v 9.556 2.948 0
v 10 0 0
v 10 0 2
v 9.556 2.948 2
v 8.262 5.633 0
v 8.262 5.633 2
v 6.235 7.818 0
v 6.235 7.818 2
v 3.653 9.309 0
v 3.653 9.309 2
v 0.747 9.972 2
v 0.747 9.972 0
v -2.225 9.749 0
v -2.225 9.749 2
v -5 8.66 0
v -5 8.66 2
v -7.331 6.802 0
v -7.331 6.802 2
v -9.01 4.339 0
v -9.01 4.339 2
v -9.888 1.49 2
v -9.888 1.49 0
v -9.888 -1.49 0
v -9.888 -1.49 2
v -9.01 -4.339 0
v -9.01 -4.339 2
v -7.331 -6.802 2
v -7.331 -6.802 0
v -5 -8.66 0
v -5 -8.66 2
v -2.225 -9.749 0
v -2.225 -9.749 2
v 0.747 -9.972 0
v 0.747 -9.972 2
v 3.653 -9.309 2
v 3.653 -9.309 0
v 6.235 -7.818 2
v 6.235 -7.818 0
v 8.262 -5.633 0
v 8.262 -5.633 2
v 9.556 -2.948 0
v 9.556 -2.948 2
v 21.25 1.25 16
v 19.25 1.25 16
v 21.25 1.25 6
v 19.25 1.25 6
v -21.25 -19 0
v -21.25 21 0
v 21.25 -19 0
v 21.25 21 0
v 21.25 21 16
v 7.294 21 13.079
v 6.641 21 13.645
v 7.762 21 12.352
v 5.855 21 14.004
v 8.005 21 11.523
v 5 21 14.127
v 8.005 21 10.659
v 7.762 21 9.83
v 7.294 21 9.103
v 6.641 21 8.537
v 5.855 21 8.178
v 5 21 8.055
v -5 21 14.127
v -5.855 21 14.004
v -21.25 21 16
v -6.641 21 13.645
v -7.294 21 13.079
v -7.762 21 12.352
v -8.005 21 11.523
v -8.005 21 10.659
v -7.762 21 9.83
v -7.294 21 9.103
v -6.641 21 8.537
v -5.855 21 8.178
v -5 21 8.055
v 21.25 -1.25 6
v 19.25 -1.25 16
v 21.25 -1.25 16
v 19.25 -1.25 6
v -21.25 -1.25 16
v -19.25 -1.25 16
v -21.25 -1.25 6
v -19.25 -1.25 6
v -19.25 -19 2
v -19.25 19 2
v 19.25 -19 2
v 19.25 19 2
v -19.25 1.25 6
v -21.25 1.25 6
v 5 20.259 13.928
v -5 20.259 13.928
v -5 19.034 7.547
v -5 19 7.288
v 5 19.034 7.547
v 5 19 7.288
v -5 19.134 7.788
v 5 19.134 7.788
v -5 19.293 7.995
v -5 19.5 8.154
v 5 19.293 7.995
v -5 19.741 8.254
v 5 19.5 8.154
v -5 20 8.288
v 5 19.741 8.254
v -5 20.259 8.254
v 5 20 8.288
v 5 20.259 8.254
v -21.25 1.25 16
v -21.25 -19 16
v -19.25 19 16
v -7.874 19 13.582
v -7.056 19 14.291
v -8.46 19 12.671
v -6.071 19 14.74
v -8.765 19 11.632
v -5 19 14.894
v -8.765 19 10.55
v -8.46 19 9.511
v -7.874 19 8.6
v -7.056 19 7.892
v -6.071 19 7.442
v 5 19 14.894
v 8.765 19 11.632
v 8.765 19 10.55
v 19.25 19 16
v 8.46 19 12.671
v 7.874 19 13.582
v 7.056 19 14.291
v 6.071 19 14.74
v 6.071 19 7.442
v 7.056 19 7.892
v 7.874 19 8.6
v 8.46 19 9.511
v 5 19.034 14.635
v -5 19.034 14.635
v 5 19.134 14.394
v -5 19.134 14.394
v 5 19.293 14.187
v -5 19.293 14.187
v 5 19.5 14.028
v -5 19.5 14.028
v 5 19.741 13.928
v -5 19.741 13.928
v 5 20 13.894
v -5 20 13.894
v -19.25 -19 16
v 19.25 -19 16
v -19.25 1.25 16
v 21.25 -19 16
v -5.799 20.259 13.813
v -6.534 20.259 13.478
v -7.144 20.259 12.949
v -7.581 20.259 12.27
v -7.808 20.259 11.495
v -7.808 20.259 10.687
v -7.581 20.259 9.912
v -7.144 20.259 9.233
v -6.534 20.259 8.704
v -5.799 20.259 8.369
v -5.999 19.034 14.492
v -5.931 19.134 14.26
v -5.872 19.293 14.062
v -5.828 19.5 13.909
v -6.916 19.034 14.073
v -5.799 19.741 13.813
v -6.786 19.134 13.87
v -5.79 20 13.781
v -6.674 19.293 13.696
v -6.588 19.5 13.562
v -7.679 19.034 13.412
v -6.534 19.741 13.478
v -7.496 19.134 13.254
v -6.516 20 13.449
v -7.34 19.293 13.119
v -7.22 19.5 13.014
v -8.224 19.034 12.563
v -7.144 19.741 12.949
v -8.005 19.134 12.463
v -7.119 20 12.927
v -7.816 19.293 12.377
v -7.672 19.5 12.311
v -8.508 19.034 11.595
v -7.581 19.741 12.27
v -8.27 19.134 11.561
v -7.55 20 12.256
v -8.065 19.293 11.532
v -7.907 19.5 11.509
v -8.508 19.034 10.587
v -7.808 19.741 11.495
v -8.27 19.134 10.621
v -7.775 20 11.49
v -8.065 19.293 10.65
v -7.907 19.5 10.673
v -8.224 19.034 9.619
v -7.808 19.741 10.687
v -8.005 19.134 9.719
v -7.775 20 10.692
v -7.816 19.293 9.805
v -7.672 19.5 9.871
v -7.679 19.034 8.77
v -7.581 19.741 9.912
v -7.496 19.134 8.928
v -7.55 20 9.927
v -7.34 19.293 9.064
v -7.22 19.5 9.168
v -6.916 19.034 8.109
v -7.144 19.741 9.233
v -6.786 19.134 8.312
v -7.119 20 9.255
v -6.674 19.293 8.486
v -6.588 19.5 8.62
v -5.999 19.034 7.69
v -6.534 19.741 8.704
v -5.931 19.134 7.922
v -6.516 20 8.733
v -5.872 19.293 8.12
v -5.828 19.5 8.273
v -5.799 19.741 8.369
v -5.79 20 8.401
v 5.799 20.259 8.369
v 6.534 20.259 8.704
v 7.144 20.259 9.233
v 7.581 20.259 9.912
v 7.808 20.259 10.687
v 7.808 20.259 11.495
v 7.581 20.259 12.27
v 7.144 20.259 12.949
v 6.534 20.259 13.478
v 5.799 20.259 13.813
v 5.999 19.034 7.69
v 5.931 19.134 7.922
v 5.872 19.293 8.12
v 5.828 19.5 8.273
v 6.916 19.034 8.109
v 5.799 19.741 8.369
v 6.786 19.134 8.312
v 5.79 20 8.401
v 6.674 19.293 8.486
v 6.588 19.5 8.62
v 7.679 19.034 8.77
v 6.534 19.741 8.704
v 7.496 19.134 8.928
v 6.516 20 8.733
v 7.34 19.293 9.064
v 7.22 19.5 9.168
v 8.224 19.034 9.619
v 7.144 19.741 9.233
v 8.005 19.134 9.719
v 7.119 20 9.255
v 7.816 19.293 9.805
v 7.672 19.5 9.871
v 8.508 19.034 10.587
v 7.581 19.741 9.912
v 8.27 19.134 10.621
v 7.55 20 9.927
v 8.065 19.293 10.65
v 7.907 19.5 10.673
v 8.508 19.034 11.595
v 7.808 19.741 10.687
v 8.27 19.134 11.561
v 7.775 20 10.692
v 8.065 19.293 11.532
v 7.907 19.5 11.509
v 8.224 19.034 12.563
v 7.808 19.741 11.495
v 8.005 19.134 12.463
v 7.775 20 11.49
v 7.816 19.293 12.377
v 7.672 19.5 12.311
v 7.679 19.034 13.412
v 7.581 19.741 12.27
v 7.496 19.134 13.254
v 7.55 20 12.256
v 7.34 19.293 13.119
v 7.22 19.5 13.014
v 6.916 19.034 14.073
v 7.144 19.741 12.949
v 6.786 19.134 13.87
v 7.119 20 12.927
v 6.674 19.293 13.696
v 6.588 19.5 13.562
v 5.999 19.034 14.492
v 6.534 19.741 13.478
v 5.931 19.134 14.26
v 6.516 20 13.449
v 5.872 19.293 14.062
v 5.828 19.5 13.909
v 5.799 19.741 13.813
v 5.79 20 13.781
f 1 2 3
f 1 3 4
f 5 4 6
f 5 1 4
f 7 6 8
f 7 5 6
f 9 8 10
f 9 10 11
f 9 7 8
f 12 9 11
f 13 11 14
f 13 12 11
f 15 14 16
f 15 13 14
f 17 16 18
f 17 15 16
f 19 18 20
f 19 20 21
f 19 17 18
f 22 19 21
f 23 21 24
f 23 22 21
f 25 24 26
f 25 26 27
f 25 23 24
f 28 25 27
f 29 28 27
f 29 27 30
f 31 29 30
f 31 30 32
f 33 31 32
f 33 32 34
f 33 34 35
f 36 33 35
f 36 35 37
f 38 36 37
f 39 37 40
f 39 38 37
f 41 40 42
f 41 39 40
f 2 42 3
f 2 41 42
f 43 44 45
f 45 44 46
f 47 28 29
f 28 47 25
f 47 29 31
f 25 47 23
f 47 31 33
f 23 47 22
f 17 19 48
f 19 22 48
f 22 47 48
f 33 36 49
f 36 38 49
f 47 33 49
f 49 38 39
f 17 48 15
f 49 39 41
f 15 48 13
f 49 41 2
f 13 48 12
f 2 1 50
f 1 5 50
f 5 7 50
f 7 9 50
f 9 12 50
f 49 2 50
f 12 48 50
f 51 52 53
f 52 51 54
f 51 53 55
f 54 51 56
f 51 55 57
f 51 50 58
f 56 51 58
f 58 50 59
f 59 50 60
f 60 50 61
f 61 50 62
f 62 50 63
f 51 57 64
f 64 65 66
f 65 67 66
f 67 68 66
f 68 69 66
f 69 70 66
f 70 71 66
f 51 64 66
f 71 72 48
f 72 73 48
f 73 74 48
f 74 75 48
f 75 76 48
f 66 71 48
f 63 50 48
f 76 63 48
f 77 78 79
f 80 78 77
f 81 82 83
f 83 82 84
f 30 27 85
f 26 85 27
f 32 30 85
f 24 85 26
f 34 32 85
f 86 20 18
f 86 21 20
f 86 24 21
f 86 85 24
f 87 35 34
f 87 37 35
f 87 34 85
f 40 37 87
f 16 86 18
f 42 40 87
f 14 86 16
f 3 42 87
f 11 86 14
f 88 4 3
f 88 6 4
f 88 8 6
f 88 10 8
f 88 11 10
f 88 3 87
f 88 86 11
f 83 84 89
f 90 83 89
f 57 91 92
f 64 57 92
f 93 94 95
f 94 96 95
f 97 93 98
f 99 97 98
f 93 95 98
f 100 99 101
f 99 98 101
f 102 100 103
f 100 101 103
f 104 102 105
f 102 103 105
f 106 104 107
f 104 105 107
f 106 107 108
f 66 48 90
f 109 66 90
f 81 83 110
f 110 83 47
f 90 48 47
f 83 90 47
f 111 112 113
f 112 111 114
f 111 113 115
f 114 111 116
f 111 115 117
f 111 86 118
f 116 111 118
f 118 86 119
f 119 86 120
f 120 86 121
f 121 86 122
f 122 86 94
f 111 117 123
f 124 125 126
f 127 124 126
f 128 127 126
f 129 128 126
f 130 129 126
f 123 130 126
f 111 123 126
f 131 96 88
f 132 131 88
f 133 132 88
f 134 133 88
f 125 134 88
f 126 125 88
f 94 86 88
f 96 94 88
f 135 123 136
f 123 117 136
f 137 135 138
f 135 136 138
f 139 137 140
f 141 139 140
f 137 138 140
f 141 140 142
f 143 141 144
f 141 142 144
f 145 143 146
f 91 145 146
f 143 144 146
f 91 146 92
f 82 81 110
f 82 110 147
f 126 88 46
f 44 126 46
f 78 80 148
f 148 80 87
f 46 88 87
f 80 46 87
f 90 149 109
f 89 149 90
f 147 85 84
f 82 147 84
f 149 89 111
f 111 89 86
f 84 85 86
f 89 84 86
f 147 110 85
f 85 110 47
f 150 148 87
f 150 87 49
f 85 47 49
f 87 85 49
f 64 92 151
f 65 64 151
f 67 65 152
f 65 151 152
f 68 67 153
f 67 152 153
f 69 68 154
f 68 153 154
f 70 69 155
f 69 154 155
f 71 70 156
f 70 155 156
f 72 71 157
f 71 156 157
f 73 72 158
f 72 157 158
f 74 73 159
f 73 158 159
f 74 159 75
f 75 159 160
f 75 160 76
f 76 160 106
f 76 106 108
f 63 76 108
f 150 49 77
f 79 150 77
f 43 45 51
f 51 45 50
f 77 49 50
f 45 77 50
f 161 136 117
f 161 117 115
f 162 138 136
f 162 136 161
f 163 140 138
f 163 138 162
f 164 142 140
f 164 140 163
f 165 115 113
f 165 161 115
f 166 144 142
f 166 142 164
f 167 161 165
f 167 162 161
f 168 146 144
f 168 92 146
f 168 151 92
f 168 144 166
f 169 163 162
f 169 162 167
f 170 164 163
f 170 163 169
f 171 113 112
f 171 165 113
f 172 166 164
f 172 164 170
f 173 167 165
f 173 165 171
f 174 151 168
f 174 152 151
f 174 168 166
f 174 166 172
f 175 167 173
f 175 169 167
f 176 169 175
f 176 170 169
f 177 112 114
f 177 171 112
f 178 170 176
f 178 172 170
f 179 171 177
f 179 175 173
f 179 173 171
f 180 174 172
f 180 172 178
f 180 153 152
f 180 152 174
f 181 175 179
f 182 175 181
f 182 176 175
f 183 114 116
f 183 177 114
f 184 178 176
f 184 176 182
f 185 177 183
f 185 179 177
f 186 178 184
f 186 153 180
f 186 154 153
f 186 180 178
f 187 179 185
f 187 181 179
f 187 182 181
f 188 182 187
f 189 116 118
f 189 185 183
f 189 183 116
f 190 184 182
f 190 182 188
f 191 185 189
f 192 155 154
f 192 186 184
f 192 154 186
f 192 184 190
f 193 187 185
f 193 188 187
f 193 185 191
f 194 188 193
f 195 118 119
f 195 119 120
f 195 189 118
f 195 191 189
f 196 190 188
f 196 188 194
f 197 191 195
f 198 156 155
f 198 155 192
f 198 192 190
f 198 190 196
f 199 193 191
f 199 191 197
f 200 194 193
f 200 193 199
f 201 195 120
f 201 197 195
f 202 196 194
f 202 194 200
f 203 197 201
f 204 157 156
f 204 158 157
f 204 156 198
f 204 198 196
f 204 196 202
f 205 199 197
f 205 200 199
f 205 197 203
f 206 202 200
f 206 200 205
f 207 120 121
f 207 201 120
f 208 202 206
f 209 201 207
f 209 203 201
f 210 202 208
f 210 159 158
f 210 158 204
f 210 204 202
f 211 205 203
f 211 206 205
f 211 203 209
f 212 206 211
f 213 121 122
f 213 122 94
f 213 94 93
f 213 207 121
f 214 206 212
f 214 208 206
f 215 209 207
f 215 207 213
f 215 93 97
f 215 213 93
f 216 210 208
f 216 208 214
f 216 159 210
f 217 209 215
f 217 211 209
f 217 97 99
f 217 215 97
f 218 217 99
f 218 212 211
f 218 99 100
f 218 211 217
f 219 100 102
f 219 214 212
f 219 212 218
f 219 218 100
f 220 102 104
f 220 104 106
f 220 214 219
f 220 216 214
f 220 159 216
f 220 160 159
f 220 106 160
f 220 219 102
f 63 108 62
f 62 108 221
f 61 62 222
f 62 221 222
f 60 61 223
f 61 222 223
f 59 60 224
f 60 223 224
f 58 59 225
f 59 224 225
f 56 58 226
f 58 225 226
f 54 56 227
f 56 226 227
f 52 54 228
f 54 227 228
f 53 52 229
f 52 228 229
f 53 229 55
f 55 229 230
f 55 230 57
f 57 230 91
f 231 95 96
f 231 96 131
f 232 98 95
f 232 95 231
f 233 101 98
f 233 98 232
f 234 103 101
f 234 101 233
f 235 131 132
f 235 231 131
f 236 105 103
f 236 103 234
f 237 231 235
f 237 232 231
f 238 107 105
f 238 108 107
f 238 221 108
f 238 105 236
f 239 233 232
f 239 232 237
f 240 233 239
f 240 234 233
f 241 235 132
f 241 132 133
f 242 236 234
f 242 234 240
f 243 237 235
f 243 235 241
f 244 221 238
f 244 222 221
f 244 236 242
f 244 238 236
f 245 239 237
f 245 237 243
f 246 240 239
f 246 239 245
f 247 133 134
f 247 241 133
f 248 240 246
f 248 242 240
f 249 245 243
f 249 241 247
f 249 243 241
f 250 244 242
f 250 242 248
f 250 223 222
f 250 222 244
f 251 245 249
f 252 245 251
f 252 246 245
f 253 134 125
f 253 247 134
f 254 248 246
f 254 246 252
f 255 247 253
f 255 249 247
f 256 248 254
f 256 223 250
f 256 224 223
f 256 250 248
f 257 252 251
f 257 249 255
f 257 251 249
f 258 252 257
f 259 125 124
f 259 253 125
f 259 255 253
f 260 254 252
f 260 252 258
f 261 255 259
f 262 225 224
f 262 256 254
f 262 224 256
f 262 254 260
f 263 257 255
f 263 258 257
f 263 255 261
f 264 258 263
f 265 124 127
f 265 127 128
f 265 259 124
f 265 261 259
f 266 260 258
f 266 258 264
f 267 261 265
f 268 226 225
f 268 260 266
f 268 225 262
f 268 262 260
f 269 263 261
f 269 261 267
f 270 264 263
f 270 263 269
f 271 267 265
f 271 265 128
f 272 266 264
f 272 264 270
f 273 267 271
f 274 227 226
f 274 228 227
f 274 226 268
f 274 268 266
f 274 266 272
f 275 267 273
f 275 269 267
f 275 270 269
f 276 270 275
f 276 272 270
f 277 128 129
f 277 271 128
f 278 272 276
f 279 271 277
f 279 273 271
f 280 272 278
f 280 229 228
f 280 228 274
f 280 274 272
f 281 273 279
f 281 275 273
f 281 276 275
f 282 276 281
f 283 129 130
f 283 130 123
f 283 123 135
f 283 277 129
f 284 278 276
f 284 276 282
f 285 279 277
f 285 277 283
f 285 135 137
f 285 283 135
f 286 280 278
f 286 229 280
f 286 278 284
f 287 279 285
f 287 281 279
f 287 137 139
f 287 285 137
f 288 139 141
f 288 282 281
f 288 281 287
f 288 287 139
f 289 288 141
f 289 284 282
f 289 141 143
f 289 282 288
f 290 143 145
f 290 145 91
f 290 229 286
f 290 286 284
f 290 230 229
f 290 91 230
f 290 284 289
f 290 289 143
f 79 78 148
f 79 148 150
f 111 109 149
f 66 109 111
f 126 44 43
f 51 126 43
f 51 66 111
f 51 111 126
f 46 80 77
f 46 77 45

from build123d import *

# Parameters (mm, degrees)
SKETCH1_W                = 38.5
SKETCH1_H                = 38
SKETCH1_R                = 10
BOSS_EXTRUDE1_DEPTH      = 2
BOSS_EXTRUDE2_DEPTH      = 14
BOSS_EXTRUDE2_DEPTH_BACK = 2
CUT_EXTRUDE1_REACH       = 50.345
SKETCH3_W                = 10
SKETCH3_H                = 2.5
CUT_EXTRUDE2_DEPTH       = 47.384938288
CUT_EXTRUDE2_DRAFT       = 15
FILLET1_R                = 1


with BuildPart() as part:
    # Sketch1 → Boss-Extrude1 (new body)
    with BuildSketch(Plane.XY):
        Rectangle(SKETCH1_W, SKETCH1_H)
        Circle(SKETCH1_R, mode=Mode.SUBTRACT)
    extrude(amount=BOSS_EXTRUDE1_DEPTH)

    # Sketch2 → Boss-Extrude2 (add, two sides: drawn at the far end of the back side and taken through both)
    with BuildSketch(Plane.XY.offset(2).offset(-BOSS_EXTRUDE2_DEPTH_BACK)):
        Polygon((-21.25, -19), (-19.25, -19), (-19.25, 19), (19.25, 19), (19.25, -19), (21.25, -19), (21.25, 21), (-21.25, 21), align=None)
    extrude(amount=BOSS_EXTRUDE2_DEPTH + BOSS_EXTRUDE2_DEPTH_BACK)

    # Sketch3 → Cut-Extrude1 (cut, up to next)
    with BuildSketch(Plane(origin=(-19.25, 0, 0), x_dir=(0, 0, -1), z_dir=(1, 0, 0)), mode=Mode.PRIVATE) as cut_extrude1_sk1:
        with Locations((-11, 0)):
            Rectangle(SKETCH3_W, SKETCH3_H)
    cut_extrude1_tool1 = extrude(cut_extrude1_sk1.sketch, amount=-CUT_EXTRUDE1_REACH, mode=Mode.PRIVATE) & part.part
    cut_extrude1 = cut_extrude1_tool1.solids().sort_by_distance((-19.25, 0, 11))[0]
    add(cut_extrude1, mode=Mode.SUBTRACT)

    # Mirror1: Cut-Extrude1 across plane
    add(cut_extrude1.mirror(Plane(origin=(0, 0, 0), x_dir=(0, 0, 1), z_dir=(1, 0, 0))), mode=Mode.SUBTRACT)


with BuildPart() as cut_extrude2_tool:
    # Sketch5 → Cut-Extrude2 (with draft: the straight prism first)
    with BuildSketch(Plane.XZ.offset(-19)):
        with BuildLine():
            ThreePointArc((-5, 13.591034656), (-7.5, 11.091034656), (-5, 8.591034656))
            Line((-5, 8.591034656), (5, 8.591034656))
            ThreePointArc((5, 8.591034656), (7.5, 11.091034656), (5, 13.591034656))
            Line((5, 13.591034656), (-5, 13.591034656))
        make_face()
    extrude(amount=-CUT_EXTRUDE2_DEPTH)
    # Cut-Extrude2: the draft: its side faces are tilted about the plane it starts from
    cut_extrude2_sides = [cut_extrude2_tool.faces().sort_by_distance(p)[0] for p in [
        (-7.5, 42.692469144, 11.091034656),
        (0, 42.692469144, 8.591034656),
        (7.5, 42.692469144, 11.091034656),
        (0, 42.692469144, 13.591034656),
    ]]
    draft(cut_extrude2_sides, Plane.XZ.offset(-19), CUT_EXTRUDE2_DRAFT)


with BuildPart() as part_1:
    add(part.part)

    # Cut-Extrude2: cut by cut_extrude2_tool
    add(cut_extrude2_tool.part, mode=Mode.SUBTRACT)

    # Fillet1
    fillet1_edges = [part_1.edges().sort_by_distance(p)[0] for p in [
        (-7.5, 19, 11.091034656),
        (0, 19, 8.591034656),
        (7.5, 19, 11.091034656),
        (0, 19, 13.591034656),
    ]]
    fillet(fillet1_edges, radius=FILLET1_R)


solid = part_1.part
